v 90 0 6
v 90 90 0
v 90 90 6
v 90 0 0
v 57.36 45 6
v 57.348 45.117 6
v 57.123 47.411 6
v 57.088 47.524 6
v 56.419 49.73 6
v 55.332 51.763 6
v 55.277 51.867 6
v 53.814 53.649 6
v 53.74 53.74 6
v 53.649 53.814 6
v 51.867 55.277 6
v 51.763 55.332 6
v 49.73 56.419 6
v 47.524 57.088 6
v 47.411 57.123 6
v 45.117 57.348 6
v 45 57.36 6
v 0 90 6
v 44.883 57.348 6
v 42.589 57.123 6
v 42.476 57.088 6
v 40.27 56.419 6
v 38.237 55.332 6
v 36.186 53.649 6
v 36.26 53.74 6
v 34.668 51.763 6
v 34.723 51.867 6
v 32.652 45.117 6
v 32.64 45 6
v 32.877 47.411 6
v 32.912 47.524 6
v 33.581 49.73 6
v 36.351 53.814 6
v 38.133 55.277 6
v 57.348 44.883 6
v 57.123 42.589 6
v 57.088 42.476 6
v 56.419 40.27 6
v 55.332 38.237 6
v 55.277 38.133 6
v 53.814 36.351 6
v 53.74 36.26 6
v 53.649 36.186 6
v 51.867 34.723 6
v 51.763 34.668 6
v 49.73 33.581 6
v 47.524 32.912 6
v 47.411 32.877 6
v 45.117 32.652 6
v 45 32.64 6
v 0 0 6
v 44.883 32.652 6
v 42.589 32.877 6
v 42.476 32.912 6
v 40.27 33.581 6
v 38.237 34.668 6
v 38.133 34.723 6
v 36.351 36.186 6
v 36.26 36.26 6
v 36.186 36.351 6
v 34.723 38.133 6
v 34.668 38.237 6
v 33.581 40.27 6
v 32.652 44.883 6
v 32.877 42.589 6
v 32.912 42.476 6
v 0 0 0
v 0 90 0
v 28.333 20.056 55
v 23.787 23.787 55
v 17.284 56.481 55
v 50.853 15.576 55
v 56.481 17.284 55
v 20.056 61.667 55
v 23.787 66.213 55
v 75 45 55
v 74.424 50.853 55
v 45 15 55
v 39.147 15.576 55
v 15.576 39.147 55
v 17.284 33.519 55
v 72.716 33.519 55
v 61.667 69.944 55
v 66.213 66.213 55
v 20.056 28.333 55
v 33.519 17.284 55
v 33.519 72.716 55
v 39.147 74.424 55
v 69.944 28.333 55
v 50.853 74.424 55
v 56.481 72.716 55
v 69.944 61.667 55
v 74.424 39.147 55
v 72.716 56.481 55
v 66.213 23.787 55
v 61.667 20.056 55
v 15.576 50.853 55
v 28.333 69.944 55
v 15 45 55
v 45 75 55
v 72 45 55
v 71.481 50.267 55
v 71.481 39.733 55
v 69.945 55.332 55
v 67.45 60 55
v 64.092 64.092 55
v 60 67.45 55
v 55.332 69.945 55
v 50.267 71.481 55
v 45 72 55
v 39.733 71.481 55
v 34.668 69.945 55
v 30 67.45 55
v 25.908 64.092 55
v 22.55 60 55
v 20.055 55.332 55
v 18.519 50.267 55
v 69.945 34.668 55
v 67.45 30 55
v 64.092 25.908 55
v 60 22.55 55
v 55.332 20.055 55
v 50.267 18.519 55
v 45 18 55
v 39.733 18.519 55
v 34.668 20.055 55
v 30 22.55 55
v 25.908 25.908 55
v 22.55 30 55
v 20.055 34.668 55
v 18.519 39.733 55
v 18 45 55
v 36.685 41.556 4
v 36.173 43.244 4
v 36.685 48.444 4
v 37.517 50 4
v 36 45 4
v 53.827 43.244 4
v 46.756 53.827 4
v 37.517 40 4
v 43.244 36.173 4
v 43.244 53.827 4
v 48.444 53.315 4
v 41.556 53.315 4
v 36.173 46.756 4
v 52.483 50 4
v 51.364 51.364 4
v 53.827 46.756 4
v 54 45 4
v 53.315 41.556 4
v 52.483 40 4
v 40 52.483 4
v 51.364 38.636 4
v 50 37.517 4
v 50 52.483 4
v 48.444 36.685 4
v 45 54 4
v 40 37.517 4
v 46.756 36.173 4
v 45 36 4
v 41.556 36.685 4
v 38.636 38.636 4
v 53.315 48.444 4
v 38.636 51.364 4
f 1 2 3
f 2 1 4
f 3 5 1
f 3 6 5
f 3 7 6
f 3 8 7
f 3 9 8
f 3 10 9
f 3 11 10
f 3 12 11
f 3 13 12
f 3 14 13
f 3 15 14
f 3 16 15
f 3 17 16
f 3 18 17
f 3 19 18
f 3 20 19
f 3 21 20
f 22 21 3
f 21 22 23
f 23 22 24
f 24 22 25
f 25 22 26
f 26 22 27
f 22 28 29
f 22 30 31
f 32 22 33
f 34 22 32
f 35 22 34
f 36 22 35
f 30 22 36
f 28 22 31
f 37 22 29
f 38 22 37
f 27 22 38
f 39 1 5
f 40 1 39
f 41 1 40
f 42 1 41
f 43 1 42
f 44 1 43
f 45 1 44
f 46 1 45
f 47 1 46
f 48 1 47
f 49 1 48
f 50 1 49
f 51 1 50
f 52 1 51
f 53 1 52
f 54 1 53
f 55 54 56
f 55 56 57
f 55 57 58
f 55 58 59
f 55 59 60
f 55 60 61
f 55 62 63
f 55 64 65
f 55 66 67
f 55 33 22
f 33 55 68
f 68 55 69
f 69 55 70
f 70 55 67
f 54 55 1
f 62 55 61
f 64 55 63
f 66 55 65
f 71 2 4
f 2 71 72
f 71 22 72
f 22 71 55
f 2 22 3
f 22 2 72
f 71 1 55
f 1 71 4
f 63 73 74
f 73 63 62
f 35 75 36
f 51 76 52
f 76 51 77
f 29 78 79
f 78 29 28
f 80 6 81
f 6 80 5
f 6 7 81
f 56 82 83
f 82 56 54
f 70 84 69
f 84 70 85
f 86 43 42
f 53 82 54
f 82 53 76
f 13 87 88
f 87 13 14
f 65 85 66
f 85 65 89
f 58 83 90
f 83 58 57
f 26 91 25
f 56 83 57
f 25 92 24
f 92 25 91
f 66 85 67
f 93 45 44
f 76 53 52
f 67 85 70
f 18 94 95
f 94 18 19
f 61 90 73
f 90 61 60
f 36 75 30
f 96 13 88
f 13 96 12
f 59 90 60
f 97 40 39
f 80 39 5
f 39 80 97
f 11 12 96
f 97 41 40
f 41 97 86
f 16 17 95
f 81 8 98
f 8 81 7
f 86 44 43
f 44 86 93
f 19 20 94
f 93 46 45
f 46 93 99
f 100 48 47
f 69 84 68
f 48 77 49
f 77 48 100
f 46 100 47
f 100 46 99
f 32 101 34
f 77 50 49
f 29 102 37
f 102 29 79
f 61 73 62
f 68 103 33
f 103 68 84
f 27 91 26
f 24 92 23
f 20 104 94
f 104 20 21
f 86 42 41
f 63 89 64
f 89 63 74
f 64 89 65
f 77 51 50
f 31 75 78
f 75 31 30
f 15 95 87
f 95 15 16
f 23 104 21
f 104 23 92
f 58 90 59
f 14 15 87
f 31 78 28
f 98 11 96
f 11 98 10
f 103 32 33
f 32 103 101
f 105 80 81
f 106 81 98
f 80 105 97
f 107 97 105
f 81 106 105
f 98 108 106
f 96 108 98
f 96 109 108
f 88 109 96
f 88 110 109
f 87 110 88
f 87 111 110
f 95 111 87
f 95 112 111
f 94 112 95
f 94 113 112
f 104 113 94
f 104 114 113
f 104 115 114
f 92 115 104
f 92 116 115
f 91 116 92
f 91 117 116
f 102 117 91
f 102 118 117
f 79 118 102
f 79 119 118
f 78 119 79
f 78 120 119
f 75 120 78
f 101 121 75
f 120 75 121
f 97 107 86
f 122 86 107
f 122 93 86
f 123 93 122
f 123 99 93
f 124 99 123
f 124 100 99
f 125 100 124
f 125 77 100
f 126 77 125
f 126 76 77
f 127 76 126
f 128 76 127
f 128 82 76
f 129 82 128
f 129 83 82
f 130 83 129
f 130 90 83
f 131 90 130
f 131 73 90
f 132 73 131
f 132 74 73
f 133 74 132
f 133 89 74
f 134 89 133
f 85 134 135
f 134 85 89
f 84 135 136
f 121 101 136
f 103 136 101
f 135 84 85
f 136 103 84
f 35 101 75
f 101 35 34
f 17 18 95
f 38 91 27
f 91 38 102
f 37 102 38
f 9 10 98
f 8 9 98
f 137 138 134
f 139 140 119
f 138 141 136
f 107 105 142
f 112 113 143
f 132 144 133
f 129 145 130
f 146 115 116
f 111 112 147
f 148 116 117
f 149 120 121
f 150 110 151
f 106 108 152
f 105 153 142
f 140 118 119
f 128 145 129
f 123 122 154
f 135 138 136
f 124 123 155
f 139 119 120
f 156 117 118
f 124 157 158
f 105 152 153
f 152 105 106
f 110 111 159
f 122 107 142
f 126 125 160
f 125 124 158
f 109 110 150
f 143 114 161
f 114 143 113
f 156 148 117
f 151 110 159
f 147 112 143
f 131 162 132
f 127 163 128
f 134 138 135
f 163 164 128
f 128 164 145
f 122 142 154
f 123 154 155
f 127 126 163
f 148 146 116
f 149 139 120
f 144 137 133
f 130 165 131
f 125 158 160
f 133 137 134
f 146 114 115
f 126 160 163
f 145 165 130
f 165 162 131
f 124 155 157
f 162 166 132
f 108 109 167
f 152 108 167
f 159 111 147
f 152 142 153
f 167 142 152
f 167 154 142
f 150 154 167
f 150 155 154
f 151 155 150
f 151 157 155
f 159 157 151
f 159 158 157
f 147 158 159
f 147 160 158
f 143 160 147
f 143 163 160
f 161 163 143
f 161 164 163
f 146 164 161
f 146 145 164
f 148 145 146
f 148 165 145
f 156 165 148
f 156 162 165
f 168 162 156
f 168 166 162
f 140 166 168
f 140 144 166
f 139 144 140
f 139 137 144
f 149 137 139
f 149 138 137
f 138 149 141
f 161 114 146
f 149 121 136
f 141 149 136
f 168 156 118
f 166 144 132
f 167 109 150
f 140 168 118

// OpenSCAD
$fn = 32;

// ----------------------------------------------------------------------
// Hopper: funnel with square flange
// ----------------------------------------------------------------------

// --- parameters (mm) ---
fl = 90;                  // flange side, X and Y
fl_t = 6;                 // flange thickness
cone_h = 50;              // cone height above the flange
top_d = 60;               // cone mouth diameter
bot_d = 24;               // cone spout diameter
wall = 3;                 // cone wall thickness
fit_tol = 0.02;           // tolerance for press fits, mm
free_tol = 0.2;           // tolerance for clearance fits, mm

bore_d = bot_d - 2 * wall;  // spout bore diameter
total_h = fl_t + cone_h - 1;  // overall height

difference() {
  union() {
    cube([fl, fl, fl_t]);
    translate([fl / 2, fl / 2, fl_t - 1])
      cylinder(h = cone_h, d1 = bot_d, d2 = top_d);
  }
  translate([fl / 2, fl / 2, fl_t - 2])
    cylinder(h = cone_h + 1, d1 = bore_d, d2 = top_d - 2 * wall);
}
